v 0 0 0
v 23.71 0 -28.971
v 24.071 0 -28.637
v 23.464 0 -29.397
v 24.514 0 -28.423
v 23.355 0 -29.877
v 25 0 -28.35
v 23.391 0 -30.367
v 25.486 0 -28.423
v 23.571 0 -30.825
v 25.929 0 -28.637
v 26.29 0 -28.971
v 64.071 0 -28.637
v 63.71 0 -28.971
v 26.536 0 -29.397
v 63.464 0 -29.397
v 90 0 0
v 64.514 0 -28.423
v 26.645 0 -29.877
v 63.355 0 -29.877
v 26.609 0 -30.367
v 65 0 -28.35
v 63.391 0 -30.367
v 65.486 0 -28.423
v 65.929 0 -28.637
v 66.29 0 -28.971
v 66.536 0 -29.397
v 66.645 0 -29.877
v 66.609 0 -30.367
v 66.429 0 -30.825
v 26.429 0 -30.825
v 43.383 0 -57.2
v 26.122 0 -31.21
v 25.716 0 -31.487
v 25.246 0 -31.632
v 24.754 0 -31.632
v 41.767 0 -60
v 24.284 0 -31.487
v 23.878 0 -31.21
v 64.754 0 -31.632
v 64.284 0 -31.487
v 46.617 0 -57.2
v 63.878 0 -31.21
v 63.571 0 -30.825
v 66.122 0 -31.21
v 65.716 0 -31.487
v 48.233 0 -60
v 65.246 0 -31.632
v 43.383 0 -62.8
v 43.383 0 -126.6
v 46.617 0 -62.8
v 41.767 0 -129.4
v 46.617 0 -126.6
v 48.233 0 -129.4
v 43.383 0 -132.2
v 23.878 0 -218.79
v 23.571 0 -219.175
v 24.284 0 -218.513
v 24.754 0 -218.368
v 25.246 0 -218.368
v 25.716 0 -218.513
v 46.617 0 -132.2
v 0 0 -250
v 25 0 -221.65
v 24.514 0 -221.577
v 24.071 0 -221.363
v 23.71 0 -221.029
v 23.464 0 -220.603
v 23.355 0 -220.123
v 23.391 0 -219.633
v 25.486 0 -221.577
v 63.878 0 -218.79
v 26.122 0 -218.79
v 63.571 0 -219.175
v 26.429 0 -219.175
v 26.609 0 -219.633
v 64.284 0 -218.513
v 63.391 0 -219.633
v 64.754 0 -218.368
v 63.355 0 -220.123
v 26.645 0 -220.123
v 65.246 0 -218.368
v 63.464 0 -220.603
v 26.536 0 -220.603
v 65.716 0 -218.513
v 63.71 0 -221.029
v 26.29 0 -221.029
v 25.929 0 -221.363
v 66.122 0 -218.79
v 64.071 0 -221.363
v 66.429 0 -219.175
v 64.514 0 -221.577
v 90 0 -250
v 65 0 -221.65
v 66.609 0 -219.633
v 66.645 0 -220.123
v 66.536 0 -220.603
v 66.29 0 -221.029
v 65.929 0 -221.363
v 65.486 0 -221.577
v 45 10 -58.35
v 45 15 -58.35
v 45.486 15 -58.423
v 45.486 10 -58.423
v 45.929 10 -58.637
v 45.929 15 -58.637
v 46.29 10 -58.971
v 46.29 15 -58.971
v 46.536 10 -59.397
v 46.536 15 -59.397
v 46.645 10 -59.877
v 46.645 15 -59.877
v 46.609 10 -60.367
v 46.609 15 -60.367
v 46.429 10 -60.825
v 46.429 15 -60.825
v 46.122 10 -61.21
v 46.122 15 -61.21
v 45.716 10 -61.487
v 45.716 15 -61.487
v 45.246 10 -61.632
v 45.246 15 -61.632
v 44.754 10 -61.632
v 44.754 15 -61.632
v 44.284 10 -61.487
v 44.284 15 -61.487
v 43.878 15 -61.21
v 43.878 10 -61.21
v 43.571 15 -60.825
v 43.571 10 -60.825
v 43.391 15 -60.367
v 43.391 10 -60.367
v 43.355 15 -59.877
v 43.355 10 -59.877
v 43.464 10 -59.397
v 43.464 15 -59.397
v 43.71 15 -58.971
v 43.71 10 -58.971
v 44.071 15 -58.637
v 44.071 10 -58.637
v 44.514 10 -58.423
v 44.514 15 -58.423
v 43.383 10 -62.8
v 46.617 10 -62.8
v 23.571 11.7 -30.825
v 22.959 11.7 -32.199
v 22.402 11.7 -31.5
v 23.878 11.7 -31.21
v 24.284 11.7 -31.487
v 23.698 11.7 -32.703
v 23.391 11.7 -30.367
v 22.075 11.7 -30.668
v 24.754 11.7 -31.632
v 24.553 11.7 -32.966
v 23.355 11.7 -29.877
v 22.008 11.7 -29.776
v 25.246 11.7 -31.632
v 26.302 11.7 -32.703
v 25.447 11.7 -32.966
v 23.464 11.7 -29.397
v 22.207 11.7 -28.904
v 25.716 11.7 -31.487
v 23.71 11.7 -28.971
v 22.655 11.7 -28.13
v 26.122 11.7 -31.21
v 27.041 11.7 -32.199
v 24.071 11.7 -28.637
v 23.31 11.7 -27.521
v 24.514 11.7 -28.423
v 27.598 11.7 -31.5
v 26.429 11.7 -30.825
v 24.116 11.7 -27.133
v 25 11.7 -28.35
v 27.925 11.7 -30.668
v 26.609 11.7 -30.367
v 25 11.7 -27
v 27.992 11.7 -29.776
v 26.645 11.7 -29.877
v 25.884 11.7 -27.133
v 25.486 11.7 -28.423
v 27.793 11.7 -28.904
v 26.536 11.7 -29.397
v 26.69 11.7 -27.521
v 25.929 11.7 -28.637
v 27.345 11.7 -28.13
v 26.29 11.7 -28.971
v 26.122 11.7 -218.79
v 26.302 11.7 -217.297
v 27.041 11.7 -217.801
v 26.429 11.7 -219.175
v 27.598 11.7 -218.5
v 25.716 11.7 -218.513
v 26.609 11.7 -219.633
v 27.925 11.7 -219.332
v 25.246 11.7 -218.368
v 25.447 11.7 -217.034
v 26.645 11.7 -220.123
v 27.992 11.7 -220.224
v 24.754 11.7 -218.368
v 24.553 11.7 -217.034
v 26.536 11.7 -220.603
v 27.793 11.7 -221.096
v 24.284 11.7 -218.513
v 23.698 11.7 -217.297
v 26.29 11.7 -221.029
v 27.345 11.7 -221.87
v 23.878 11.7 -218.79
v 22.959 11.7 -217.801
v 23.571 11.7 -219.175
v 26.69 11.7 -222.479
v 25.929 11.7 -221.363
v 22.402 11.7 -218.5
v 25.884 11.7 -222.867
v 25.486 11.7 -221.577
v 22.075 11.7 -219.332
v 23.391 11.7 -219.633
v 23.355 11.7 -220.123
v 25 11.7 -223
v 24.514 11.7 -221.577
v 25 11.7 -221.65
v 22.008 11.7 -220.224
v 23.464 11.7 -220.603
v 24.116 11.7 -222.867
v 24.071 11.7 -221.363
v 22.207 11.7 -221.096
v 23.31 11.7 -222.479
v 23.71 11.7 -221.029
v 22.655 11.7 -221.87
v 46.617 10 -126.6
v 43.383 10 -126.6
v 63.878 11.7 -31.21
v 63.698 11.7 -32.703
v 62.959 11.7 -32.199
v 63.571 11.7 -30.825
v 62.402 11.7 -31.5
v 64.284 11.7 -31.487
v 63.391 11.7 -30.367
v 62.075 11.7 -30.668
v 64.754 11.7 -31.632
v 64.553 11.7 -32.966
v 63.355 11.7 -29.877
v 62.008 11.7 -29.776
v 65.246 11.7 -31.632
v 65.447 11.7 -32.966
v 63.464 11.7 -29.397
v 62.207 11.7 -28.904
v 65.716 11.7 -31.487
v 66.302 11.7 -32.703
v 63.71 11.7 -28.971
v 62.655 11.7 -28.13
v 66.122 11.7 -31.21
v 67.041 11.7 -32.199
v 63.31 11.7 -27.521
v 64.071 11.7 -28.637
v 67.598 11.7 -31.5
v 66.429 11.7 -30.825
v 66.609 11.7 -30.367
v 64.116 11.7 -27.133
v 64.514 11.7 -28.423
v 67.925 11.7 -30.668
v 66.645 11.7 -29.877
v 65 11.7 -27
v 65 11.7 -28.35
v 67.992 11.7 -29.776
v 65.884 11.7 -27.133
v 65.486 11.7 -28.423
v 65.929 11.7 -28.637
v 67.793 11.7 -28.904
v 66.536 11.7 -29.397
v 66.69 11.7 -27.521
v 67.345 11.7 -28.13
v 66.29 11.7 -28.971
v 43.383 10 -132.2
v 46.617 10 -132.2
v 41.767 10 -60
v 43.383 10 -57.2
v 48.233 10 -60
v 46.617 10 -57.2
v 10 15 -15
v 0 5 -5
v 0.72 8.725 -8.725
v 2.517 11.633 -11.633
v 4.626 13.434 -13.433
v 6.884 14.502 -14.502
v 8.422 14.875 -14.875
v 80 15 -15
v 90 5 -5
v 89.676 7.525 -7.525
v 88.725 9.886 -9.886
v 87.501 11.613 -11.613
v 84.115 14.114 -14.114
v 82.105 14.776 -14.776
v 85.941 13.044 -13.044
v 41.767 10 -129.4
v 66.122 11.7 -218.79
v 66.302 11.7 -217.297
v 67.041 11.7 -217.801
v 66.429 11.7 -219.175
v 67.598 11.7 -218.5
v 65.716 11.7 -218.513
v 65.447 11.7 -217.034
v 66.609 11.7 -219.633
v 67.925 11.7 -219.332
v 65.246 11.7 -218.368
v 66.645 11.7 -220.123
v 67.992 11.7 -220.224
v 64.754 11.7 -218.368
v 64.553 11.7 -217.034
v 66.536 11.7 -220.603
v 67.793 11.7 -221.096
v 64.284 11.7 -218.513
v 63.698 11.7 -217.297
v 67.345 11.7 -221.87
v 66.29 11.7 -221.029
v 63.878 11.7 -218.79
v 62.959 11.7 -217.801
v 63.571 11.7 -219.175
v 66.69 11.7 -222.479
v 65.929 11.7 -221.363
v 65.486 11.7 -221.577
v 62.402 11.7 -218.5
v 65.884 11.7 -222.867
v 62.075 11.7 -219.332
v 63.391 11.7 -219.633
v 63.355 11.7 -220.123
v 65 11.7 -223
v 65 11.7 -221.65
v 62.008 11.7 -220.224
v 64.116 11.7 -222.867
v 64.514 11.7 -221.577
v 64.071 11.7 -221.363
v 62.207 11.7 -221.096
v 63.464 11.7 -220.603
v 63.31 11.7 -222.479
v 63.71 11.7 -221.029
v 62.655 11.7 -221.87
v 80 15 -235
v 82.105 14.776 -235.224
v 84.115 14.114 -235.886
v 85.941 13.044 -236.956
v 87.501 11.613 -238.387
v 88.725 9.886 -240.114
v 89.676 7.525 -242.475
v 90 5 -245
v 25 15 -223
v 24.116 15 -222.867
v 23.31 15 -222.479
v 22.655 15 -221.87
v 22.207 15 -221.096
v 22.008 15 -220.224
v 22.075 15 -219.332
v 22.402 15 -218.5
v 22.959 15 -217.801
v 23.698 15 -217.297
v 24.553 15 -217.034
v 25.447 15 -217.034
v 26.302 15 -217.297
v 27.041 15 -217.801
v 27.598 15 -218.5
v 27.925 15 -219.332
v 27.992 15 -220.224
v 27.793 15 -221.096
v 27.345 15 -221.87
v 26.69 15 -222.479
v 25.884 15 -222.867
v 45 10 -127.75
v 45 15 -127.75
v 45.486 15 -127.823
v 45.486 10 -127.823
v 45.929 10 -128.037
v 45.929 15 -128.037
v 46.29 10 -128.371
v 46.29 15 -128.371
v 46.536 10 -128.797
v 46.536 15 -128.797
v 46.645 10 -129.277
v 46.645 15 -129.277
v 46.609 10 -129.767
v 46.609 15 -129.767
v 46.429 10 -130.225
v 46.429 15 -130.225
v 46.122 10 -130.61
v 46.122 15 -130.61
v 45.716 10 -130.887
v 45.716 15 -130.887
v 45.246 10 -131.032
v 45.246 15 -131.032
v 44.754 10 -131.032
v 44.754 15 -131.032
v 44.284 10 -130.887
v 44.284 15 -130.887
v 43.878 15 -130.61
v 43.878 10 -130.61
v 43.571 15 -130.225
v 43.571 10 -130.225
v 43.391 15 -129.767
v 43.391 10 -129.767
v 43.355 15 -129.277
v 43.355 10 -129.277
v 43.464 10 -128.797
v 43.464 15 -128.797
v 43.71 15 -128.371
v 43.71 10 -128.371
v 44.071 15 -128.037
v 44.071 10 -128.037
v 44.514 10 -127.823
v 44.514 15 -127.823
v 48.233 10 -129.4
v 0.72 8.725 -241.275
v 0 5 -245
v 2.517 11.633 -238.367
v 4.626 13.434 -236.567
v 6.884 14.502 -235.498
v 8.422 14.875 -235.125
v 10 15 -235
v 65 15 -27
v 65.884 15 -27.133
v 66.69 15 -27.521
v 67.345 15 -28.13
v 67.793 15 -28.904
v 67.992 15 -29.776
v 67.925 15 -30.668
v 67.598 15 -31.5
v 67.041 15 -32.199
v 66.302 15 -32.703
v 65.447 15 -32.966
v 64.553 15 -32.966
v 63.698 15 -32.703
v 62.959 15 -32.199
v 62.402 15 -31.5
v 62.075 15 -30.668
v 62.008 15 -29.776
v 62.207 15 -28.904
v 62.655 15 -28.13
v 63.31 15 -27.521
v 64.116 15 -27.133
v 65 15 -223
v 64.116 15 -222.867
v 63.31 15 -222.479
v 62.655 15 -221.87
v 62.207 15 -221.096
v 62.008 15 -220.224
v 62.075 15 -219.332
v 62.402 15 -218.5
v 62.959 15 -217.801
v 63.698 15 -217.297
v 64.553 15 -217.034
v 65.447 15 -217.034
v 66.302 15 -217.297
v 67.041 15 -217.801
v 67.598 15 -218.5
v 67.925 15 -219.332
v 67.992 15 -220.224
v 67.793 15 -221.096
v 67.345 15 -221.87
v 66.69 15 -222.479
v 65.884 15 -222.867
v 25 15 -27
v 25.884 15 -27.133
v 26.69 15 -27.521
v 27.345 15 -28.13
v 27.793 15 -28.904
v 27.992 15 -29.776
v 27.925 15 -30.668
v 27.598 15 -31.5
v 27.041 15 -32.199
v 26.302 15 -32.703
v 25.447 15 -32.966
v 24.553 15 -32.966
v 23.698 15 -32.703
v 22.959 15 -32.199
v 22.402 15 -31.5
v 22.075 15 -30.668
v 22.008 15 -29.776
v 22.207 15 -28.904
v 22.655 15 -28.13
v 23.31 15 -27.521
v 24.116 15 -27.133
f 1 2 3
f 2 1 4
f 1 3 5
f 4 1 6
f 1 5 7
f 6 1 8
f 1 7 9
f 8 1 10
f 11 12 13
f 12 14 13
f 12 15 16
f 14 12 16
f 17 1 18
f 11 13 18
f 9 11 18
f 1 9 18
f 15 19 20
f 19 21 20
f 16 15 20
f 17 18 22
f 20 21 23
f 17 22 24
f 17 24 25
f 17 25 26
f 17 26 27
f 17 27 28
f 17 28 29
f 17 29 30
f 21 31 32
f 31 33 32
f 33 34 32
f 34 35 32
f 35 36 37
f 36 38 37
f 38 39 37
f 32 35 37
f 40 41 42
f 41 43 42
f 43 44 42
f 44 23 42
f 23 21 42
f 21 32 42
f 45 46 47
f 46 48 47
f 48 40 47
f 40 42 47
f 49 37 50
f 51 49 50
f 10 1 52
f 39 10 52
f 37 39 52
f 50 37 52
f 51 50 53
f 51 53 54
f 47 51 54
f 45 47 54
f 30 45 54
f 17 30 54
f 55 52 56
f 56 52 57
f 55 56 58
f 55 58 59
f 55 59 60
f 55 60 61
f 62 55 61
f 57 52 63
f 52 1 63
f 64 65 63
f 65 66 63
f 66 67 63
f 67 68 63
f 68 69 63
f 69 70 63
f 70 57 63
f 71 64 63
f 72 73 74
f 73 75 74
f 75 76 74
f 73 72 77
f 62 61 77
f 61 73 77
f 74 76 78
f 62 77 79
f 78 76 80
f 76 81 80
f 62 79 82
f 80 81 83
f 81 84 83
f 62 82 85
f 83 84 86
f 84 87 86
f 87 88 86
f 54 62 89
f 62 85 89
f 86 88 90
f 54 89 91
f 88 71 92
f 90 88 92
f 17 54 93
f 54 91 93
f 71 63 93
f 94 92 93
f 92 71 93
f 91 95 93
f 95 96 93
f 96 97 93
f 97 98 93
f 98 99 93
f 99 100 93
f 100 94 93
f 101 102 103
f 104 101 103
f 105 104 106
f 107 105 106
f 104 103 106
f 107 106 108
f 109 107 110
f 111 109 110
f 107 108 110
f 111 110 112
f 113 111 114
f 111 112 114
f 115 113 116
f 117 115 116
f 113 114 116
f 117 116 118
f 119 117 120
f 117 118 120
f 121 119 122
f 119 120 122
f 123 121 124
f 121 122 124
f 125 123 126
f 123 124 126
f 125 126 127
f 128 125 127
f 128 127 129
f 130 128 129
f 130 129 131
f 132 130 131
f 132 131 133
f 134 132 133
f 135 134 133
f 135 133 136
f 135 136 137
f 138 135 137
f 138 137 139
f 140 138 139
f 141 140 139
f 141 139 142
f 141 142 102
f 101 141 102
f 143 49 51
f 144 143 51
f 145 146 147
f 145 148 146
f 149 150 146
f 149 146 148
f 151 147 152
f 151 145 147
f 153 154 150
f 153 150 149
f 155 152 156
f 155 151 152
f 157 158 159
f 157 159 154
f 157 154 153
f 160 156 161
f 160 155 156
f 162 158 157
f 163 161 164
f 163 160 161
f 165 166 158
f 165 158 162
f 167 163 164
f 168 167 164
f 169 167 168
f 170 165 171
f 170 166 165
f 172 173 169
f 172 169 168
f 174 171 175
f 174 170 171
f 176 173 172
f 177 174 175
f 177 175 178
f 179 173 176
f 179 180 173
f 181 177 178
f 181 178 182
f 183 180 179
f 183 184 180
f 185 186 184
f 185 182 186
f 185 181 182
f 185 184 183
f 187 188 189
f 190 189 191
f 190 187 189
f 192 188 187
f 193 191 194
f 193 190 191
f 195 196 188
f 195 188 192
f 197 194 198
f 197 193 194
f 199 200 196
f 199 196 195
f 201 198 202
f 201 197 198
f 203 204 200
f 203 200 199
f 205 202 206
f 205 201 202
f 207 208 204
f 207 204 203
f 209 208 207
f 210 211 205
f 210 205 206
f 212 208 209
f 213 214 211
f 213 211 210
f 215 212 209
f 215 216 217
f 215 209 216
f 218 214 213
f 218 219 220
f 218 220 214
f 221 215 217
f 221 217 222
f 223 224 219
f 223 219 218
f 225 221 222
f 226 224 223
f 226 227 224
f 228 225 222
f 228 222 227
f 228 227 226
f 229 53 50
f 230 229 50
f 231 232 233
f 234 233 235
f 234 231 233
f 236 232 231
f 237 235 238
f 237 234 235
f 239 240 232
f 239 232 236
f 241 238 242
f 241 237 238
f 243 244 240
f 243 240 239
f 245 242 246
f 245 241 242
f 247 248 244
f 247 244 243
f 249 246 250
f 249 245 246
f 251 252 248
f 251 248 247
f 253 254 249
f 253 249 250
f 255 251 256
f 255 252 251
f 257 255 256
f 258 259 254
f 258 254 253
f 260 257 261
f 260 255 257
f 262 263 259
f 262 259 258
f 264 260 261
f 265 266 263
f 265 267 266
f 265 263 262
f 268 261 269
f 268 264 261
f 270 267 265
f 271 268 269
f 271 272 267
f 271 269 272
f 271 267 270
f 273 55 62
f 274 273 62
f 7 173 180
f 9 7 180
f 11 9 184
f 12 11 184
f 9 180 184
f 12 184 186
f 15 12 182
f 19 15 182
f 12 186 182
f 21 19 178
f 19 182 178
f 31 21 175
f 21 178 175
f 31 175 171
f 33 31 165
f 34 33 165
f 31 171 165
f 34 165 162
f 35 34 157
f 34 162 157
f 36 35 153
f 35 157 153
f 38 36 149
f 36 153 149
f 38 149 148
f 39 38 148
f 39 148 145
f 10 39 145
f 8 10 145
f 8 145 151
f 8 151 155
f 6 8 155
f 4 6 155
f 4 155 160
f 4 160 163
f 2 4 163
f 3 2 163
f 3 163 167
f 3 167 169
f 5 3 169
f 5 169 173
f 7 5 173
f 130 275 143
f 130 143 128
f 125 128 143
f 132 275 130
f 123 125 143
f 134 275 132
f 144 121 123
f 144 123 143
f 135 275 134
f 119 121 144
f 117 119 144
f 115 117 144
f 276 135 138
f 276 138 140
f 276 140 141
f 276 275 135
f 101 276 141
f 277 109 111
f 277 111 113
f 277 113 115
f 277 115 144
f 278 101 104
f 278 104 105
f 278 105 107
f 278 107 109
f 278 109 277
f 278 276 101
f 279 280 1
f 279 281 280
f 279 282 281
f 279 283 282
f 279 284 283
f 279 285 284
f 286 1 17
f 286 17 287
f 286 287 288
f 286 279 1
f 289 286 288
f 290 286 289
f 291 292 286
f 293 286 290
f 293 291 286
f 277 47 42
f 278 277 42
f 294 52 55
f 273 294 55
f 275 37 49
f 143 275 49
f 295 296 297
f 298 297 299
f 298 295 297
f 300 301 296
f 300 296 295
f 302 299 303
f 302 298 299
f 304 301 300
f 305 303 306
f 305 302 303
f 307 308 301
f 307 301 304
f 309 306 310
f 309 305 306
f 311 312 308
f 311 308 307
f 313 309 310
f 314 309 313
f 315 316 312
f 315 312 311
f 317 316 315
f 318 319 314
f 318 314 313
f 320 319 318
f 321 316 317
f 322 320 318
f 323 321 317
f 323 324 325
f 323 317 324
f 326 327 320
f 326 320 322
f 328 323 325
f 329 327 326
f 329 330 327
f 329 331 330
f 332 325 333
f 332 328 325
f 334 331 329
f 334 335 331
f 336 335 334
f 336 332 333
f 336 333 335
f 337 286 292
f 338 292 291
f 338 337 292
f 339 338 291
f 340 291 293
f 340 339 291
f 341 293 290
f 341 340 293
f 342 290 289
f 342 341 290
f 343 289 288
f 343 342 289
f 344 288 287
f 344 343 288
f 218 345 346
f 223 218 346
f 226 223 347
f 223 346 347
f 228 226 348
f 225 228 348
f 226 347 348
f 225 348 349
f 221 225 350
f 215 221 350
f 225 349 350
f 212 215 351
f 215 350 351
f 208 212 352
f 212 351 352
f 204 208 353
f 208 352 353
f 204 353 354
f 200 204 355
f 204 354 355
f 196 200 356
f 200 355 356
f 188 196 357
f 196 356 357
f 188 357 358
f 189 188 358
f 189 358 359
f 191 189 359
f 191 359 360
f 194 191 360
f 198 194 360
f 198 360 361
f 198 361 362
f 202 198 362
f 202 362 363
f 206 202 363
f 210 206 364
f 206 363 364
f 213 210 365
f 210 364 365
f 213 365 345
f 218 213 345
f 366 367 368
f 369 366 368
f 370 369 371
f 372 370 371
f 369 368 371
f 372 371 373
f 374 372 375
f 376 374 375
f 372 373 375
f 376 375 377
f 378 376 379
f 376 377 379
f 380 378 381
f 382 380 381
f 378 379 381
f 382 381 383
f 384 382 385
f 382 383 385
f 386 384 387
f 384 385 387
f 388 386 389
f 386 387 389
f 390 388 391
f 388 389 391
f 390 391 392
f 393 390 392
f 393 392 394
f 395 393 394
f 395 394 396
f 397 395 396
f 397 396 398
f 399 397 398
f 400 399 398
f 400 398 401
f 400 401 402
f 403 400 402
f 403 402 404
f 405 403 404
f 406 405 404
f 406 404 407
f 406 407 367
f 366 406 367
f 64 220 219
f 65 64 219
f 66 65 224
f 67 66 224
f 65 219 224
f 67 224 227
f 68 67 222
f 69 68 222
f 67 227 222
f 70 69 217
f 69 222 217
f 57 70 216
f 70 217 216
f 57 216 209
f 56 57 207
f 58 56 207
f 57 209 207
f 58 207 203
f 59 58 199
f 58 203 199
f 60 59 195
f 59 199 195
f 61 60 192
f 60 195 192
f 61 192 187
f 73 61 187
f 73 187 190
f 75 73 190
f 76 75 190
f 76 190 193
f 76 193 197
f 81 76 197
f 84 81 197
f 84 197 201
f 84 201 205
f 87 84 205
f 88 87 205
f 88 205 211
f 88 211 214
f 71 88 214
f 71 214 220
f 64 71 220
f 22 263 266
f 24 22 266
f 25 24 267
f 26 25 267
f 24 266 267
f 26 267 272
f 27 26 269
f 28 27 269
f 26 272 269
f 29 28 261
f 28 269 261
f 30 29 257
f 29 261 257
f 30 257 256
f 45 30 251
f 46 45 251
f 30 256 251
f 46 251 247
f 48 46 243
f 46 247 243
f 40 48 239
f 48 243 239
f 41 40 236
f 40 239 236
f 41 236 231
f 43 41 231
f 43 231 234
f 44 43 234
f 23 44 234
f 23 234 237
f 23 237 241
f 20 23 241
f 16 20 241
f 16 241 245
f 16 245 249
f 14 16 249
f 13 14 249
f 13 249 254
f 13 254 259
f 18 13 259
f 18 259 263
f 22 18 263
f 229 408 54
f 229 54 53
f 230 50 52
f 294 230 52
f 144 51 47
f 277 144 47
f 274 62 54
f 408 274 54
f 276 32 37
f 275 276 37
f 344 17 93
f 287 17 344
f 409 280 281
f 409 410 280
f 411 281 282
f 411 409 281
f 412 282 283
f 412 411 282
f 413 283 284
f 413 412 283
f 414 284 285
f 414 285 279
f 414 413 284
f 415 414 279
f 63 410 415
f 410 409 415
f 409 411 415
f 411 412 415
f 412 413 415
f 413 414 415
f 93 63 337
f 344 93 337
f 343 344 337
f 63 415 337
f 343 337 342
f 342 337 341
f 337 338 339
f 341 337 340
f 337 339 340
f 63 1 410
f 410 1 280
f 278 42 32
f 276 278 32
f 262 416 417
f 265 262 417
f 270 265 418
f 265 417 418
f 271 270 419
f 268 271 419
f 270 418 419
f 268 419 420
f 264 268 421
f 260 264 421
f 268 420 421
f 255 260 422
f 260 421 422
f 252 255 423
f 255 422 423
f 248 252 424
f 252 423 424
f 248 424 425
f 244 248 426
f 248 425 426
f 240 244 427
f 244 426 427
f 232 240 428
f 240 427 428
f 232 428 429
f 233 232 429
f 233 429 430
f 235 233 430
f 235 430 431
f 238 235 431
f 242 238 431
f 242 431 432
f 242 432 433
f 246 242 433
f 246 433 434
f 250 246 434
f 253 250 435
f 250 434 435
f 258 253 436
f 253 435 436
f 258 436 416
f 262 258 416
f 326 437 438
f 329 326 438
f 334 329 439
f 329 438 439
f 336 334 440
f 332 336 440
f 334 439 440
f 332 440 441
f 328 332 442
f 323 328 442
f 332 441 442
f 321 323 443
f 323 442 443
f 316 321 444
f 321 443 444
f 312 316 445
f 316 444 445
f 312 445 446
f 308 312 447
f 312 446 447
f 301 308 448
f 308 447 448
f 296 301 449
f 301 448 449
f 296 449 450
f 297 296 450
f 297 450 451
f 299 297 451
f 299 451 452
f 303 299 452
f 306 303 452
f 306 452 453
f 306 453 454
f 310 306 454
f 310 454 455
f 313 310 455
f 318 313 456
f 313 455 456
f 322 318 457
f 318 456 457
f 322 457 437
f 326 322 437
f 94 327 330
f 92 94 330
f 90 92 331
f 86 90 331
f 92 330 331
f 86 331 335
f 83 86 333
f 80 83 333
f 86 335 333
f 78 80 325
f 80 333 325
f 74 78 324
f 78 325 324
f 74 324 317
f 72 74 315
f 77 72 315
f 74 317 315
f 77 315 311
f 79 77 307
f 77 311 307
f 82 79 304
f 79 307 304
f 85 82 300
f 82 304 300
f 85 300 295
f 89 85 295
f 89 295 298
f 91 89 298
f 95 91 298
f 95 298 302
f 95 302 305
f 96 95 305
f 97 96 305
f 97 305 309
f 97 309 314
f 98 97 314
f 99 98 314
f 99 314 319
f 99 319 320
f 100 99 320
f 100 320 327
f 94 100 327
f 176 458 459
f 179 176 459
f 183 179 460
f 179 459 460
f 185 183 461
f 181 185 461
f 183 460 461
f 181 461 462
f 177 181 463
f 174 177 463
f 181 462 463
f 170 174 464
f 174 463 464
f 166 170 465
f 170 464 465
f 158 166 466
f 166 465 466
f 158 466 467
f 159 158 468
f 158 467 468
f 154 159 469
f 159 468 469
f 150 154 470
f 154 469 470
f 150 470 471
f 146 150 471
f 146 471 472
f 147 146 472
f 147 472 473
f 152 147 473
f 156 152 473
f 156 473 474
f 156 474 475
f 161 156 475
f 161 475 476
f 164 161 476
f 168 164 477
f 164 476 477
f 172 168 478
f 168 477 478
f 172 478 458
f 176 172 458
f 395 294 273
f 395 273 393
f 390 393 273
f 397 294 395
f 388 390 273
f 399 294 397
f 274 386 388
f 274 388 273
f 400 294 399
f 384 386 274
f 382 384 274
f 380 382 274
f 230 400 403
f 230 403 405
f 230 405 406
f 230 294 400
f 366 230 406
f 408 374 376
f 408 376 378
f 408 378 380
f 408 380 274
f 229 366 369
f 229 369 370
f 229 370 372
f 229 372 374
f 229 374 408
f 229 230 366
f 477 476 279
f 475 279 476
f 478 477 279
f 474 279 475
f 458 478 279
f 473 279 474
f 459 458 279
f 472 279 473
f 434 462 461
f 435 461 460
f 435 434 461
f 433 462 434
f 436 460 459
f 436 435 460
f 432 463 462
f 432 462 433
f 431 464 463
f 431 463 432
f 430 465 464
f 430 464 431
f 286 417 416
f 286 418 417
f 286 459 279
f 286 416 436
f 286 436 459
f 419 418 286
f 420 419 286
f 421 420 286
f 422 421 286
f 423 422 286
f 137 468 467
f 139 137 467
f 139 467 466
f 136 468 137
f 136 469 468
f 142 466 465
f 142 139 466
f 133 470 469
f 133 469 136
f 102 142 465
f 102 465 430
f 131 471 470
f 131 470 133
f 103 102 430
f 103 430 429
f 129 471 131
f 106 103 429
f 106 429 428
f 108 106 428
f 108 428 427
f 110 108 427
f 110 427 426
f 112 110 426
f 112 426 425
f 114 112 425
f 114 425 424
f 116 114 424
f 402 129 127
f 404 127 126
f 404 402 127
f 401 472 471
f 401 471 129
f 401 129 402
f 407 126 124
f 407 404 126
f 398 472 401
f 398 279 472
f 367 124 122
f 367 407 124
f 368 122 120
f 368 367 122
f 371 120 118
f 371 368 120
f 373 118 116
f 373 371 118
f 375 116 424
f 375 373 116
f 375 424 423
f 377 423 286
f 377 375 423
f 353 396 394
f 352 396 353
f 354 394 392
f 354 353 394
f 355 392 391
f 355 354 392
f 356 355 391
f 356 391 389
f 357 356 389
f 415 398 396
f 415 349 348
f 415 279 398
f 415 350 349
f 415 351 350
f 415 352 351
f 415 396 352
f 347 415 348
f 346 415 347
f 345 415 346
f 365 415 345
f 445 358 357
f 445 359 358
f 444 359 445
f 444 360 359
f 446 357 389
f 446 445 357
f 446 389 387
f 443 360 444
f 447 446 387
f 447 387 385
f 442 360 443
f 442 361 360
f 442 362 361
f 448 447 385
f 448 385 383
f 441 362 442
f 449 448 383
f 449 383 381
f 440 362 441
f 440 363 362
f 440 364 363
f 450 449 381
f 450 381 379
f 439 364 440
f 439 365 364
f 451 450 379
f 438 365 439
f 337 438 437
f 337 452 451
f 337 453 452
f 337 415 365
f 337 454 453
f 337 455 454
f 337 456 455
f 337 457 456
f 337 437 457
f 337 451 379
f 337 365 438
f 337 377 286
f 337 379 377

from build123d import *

# Parameters (mm, degrees)
SKETCH1_W           = 90
SKETCH1_H           = 250
BOSS_EXTRUDE1_DEPTH = 15
CHAMFER1_SIZE       = 15
FILLET1_R           = 10
SKETCH2_R           = 1.65
CUT_EXTRUDE1_DEPTH  = 267.129667643
SKETCH3_R           = 3
CUT_EXTRUDE2_DEPTH  = 3.3
SKETCH4_R           = 1.65
CUT_EXTRUDE3_DEPTH  = 267.129667643
CUT_EXTRUDE5_DEPTH  = 10


with BuildPart() as part:
    # Sketch1 → Boss-Extrude1 (new body)
    with BuildSketch(Plane(origin=(0, 0, 0), x_dir=(1, 0, 0), z_dir=(0, 1, 0))):
        with Locations((45, 125)):
            Rectangle(SKETCH1_W, SKETCH1_H)
    extrude(amount=BOSS_EXTRUDE1_DEPTH)

    # Chamfer1
    chamfer1_edges = [part.edges().sort_by_distance(p)[0] for p in [
        (45, 15, 0),
        (45, 15, -250),
    ]]
    chamfer(chamfer1_edges, length=CHAMFER1_SIZE - 0.0001)  # a hair under: the kernel refuses the full size

    # Fillet1
    fillet1_edges = [part.edges().sort_by_distance(p)[0] for p in [
        (0, 15, -125),
        (90, 15, -125),
    ]]
    fillet(fillet1_edges, radius=FILLET1_R)

    # Sketch2 → Cut-Extrude1 (cut, through all)
    with BuildSketch(Plane(origin=(0, 15, 0), x_dir=(1, 0, 0), z_dir=(0, 1, 0))):
        with Locations(Location((25, 30, 0), (0, 0, 270))):
            Circle(SKETCH2_R)
        with Locations(Location((65, 30, 0), (0, 0, 270))):
            Circle(SKETCH2_R)
        with Locations(Location((65, 220, 0), (0, 0, 90))):
            Circle(SKETCH2_R)
        with Locations(Location((25, 220, 0), (0, 0, 90))):
            Circle(SKETCH2_R)
    extrude(amount=-CUT_EXTRUDE1_DEPTH, mode=Mode.SUBTRACT)

    # Sketch3 → Cut-Extrude2 (cut)
    with BuildSketch(Plane(origin=(0, 15, 0), x_dir=(1, 0, 0), z_dir=(0, 1, 0))):
        with Locations(Location((25, 30, 0), (0, 0, 270))):
            Circle(SKETCH3_R)
        with Locations(Location((65, 30, 0), (0, 0, 270))):
            Circle(SKETCH3_R)
        with Locations(Location((65, 220, 0), (0, 0, 90))):
            Circle(SKETCH3_R)
        with Locations(Location((25, 220, 0), (0, 0, 90))):
            Circle(SKETCH3_R)
    extrude(amount=-CUT_EXTRUDE2_DEPTH, mode=Mode.SUBTRACT)

    # Sketch4 → Cut-Extrude3 (cut, through all)
    with BuildSketch(Plane(origin=(0, 15, 0), x_dir=(1, 0, 0), z_dir=(0, 1, 0))):
        with Locations(Location((45, 60, 0), (0, 0, 270))):
            Circle(SKETCH4_R)
        with Locations(Location((45, 129.4, 0), (0, 0, 270))):
            Circle(SKETCH4_R)
    extrude(amount=-CUT_EXTRUDE3_DEPTH, mode=Mode.SUBTRACT)

    # Sketch5 → Cut-Extrude5 (cut)
    with BuildSketch(Plane.XZ):
        Polygon((48.233161507, -60), (46.616580754, -57.2), (43.383419246, -57.2), (41.766838493, -60), (43.383419246, -62.8), (46.616580754, -62.8), align=None)
        Polygon((48.233161507, -129.4), (46.616580754, -126.6), (43.383419246, -126.6), (41.766838493, -129.4), (43.383419246, -132.2), (46.616580754, -132.2), align=None)
    extrude(amount=-CUT_EXTRUDE5_DEPTH, mode=Mode.SUBTRACT)


solid = part.part
